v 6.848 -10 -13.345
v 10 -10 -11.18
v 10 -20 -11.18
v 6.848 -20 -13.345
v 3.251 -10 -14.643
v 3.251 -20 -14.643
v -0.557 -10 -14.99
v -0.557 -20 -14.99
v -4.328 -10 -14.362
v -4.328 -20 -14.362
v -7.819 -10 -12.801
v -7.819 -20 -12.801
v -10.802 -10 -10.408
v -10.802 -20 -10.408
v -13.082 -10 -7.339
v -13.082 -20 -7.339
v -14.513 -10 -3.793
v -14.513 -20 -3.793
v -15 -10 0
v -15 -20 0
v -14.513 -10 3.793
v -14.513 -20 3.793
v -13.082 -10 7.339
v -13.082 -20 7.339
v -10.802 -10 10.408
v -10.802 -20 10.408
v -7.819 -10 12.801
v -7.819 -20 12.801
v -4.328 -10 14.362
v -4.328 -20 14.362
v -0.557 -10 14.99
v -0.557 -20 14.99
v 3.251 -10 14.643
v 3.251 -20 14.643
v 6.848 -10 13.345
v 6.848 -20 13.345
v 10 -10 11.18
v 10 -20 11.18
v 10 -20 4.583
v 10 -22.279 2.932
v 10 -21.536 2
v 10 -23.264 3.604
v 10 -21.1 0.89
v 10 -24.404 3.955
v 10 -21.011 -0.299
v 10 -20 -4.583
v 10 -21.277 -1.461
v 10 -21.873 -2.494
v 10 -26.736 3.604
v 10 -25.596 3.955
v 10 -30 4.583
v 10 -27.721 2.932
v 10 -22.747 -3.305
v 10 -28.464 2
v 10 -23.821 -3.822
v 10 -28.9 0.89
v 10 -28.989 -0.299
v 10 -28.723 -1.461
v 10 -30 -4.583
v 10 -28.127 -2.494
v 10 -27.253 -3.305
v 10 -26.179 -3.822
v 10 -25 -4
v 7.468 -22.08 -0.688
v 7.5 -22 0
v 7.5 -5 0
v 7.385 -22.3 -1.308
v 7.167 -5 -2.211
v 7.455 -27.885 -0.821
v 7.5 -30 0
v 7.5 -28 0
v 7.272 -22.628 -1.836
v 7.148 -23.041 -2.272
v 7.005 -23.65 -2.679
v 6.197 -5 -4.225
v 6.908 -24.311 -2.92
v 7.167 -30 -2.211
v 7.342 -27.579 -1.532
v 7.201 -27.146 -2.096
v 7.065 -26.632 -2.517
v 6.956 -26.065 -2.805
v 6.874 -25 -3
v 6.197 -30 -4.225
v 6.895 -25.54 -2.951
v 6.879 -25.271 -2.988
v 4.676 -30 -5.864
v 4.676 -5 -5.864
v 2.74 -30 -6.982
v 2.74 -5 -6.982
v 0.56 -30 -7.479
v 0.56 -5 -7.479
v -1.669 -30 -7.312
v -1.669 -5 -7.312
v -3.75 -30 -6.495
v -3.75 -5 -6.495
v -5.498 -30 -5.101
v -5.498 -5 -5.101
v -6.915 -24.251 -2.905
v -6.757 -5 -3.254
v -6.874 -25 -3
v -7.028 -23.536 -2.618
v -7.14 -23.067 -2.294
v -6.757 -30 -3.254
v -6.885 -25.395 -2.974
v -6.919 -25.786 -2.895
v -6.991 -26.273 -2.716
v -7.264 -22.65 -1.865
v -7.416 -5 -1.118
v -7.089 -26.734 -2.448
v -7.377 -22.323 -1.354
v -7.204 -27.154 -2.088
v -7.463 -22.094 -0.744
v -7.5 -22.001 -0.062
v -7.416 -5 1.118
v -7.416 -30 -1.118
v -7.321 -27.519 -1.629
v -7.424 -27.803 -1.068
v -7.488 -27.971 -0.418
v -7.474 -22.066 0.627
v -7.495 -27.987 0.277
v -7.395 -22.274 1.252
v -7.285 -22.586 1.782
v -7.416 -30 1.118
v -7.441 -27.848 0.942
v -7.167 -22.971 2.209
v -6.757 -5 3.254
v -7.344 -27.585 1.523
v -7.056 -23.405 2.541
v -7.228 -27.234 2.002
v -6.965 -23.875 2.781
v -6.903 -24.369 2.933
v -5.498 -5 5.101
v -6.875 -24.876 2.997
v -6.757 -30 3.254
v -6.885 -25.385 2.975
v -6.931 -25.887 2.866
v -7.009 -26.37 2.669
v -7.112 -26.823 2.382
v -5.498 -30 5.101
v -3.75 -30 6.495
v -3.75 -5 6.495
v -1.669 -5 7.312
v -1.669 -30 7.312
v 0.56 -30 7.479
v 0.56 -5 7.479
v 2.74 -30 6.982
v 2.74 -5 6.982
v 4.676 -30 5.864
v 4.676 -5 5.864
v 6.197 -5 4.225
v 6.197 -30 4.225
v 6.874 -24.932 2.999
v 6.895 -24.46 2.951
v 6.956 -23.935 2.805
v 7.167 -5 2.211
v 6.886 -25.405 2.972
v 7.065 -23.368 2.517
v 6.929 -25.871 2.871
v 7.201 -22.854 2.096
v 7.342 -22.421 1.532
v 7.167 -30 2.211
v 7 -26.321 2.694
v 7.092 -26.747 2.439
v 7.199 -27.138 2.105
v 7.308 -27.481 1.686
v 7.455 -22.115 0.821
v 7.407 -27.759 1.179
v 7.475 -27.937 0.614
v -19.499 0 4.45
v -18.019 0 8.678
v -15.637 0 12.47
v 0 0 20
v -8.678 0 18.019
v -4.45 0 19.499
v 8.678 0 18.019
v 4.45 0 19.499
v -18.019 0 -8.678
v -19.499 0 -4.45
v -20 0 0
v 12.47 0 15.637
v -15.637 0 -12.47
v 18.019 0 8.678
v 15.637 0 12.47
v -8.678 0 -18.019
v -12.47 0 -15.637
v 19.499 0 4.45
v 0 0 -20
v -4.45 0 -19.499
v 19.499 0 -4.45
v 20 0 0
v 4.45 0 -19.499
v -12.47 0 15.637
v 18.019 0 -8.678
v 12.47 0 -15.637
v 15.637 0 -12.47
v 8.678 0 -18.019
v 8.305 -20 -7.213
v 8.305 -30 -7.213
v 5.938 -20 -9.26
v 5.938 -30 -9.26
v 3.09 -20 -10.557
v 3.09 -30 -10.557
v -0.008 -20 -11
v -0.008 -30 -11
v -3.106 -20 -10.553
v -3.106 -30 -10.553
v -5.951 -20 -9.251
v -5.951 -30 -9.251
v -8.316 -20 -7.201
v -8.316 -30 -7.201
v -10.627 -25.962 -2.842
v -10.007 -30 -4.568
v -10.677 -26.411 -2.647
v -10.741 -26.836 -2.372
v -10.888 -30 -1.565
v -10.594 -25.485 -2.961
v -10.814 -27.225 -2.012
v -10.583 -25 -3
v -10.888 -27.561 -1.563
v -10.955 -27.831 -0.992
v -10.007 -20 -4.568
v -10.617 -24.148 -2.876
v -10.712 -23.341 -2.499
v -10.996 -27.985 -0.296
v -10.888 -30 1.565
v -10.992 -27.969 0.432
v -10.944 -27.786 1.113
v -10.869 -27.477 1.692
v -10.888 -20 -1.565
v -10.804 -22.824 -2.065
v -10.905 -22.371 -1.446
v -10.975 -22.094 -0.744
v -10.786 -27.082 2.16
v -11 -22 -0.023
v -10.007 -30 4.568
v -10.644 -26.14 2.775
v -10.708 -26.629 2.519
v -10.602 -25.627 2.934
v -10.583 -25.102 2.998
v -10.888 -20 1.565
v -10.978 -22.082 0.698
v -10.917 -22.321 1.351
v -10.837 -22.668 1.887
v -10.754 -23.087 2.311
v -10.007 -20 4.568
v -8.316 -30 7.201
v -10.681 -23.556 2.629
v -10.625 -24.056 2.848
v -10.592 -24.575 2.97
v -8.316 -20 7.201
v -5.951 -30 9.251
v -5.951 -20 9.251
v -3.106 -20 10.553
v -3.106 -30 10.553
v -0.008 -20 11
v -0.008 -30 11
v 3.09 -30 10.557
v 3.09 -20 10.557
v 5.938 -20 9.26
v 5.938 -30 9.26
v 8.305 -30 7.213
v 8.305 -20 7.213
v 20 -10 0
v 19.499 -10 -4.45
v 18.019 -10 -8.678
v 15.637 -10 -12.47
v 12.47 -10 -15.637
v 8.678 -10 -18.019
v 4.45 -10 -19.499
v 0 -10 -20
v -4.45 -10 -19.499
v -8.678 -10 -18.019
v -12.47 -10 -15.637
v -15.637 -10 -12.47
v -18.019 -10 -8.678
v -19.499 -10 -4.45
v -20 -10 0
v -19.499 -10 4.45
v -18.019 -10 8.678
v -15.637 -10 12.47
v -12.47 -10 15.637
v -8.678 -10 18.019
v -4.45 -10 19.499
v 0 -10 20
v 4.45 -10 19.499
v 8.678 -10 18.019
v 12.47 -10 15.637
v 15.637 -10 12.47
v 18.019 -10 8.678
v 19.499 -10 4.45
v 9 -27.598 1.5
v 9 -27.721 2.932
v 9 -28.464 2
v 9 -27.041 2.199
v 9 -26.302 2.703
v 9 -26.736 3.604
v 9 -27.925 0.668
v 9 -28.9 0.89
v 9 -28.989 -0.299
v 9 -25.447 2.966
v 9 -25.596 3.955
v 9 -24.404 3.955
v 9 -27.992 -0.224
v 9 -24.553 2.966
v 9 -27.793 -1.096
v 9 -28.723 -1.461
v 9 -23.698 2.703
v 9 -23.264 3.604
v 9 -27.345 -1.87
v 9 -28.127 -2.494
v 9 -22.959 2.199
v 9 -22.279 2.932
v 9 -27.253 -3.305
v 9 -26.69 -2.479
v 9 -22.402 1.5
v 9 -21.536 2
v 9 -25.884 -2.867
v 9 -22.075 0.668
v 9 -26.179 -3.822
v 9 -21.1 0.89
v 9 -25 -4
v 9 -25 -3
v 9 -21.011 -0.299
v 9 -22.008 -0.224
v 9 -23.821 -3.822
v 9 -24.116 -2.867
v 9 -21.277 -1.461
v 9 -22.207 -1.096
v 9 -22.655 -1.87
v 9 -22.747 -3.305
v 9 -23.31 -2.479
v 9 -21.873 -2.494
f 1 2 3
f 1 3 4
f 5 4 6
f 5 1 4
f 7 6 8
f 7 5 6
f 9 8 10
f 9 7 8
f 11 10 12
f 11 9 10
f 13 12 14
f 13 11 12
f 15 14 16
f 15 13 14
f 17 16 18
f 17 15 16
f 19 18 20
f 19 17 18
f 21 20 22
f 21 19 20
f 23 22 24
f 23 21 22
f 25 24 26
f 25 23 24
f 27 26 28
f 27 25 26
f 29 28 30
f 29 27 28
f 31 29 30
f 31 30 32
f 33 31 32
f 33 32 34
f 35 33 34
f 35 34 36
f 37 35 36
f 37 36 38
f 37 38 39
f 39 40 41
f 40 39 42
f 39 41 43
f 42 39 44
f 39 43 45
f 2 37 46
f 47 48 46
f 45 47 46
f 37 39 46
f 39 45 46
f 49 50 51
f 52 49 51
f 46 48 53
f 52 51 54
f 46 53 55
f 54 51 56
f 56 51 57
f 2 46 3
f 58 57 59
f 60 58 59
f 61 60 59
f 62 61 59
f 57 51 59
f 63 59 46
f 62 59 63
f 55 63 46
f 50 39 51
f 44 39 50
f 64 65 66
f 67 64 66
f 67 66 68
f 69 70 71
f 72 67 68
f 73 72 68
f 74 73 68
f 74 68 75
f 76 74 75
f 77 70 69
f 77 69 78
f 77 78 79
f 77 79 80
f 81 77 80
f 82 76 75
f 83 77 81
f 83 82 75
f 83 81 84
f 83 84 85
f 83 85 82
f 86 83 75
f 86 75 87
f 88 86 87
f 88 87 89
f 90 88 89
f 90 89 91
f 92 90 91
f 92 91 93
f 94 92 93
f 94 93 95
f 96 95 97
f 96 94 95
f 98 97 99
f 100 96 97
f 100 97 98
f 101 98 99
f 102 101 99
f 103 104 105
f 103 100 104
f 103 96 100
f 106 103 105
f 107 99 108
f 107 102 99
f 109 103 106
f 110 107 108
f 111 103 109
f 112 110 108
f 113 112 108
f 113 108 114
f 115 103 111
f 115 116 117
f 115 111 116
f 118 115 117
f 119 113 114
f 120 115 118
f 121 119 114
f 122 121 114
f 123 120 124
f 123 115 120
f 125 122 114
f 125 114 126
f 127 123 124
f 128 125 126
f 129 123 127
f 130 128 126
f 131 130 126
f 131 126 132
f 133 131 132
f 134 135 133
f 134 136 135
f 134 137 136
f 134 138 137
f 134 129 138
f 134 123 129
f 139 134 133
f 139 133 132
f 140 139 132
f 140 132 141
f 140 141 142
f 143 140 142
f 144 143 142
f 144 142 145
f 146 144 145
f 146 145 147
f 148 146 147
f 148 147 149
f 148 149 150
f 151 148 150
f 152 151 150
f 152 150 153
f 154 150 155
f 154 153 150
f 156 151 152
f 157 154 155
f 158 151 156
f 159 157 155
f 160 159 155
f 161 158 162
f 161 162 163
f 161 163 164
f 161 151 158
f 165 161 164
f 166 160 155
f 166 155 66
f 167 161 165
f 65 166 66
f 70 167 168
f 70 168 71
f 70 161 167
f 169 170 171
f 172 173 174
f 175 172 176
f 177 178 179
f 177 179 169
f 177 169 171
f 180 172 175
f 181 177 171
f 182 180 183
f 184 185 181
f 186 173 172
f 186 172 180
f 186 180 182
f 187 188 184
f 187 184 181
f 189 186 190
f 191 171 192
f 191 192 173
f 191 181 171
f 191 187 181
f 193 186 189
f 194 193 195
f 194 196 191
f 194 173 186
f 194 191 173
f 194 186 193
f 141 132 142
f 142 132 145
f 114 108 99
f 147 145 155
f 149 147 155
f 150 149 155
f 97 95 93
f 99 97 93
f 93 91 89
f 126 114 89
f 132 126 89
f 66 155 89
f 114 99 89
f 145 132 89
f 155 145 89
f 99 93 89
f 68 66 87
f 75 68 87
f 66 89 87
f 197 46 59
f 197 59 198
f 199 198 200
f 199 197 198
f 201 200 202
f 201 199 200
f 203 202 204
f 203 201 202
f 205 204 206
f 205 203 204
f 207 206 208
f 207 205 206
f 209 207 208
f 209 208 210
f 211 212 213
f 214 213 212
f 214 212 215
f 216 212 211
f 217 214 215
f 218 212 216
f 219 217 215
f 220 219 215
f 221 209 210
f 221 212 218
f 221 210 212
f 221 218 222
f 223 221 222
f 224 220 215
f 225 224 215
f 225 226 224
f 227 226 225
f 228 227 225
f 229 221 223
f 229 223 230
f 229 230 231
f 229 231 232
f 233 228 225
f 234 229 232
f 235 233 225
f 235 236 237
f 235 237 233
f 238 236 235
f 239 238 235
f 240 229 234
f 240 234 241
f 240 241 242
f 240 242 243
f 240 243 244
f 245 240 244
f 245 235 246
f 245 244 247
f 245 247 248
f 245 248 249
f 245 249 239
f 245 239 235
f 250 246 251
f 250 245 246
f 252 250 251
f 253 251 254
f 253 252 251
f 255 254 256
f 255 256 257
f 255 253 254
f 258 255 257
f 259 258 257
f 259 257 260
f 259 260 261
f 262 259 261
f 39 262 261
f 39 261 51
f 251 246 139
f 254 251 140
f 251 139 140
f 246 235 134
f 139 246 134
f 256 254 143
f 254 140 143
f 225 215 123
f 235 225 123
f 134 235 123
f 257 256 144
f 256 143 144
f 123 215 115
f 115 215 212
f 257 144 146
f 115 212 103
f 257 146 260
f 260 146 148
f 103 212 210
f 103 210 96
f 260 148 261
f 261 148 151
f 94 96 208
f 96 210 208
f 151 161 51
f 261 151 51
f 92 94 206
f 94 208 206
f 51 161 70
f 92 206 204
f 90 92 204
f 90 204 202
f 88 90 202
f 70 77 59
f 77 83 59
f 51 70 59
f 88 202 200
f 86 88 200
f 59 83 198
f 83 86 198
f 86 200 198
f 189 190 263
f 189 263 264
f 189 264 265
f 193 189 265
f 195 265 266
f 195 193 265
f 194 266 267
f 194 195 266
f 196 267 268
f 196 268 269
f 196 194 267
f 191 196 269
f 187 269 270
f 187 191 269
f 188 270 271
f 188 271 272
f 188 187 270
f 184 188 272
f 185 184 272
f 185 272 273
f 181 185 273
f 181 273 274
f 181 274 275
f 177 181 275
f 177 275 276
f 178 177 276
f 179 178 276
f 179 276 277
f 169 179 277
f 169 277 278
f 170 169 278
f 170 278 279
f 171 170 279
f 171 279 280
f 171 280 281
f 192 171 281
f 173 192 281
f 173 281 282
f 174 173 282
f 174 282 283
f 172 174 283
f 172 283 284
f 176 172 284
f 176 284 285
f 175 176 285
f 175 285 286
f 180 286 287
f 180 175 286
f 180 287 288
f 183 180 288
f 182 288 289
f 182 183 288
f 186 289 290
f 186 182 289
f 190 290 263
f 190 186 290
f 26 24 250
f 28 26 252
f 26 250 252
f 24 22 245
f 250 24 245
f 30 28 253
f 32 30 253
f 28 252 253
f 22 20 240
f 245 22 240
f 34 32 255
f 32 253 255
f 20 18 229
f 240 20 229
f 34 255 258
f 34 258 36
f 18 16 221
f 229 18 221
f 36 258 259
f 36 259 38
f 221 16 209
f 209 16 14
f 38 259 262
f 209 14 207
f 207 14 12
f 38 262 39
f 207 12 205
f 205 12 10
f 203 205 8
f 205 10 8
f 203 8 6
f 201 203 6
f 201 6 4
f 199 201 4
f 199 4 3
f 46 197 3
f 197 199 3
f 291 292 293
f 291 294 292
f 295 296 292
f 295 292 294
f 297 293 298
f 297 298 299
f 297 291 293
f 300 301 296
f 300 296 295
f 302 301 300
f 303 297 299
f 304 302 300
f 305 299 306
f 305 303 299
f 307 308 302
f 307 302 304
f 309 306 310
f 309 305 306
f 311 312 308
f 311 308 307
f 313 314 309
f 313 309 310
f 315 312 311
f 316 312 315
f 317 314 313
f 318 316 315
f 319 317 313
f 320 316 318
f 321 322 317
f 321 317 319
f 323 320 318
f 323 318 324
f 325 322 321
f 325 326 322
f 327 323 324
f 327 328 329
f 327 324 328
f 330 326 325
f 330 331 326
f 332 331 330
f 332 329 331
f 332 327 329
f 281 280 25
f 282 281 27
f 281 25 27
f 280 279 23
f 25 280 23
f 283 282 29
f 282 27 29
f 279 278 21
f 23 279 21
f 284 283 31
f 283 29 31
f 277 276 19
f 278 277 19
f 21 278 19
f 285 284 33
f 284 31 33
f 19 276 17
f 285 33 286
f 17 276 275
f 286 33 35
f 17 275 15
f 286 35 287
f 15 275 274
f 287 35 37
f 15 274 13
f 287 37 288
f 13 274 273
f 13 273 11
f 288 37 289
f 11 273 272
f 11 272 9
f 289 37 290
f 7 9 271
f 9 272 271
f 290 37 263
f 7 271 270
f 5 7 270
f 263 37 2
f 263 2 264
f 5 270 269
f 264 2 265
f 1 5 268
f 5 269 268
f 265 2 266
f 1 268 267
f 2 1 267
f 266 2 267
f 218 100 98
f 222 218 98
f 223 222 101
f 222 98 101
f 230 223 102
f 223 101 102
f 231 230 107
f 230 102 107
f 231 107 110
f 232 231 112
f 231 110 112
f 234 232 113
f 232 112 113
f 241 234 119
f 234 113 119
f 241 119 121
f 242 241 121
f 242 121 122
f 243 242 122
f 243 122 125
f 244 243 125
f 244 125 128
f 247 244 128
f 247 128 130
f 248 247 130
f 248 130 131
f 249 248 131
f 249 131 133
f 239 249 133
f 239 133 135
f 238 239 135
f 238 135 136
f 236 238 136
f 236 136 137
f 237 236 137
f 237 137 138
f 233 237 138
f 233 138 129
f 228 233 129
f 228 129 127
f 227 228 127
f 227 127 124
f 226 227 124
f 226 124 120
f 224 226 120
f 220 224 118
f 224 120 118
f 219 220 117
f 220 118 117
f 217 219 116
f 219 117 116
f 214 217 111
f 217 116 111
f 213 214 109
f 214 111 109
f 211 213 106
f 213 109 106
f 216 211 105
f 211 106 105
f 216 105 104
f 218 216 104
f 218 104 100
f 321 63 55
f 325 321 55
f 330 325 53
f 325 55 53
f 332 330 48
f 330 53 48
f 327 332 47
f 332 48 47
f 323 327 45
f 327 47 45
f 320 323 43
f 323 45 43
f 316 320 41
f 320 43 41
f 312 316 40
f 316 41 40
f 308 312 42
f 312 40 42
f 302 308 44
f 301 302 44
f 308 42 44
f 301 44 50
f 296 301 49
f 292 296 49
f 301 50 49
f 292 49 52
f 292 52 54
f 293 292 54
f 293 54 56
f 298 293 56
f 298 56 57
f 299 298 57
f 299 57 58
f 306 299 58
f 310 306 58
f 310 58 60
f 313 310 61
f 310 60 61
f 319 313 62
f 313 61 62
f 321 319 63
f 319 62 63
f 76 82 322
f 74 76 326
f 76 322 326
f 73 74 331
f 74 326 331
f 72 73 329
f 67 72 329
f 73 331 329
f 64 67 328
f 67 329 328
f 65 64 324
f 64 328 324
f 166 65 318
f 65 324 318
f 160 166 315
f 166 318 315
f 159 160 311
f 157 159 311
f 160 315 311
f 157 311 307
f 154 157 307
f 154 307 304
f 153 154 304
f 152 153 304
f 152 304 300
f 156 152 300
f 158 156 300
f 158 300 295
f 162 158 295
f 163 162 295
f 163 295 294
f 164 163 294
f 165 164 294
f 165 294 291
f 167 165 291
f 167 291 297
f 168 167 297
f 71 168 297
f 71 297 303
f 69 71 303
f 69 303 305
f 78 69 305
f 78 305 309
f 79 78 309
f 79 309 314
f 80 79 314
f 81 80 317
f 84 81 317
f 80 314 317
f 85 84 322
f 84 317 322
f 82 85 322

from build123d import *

# Parameters (mm, degrees)
SKETCH1_R           = 20
STOCK_DEPTH         = 20
CUT_EXTRUDE1_START  = -10
SKETCH2_OUTSIDE_W   = 54
SKETCH2_OUTSIDE_H   = 54
SKETCH2_OUTSIDE_R   = 15
CUT_EXTRUDE1_DEPTH  = 10
BOSS_EXTRUDE2_START = -20
SKETCH4_R           = 11
BOSS_EXTRUDE2_DEPTH = 10
MAINKEY_START       = -30
SKETCH3_W           = 10
SKETCH3_H           = 22.360679774
MAINKEY_DEPTH       = 20
CENTREBORE_START    = -30
SKETCH5_R           = 7.5
CENTREBORE_DEPTH    = 25
SKETCH6_R           = 3
HOLES_DEPTH         = 23.674794
SKETCH7_R           = 4
CUT_EXTRUDE4_DEPTH  = 1


with BuildPart() as part:
    # Sketch1 → Stock (new body)
    with BuildSketch(Plane(origin=(0, 0, 0), x_dir=(1, 0, 0), z_dir=(0, 1, 0))):
        Circle(SKETCH1_R)
    extrude(amount=-STOCK_DEPTH)

    # Sketch2 outside → Cut-Extrude1 (cut)
    with BuildSketch(Plane(origin=(0, 0, 0), x_dir=(1, 0, 0), z_dir=(0, 1, 0)).offset(CUT_EXTRUDE1_START)):
        Rectangle(SKETCH2_OUTSIDE_W, SKETCH2_OUTSIDE_H)
        Circle(SKETCH2_OUTSIDE_R, mode=Mode.SUBTRACT)
    extrude(amount=-CUT_EXTRUDE1_DEPTH, mode=Mode.SUBTRACT)

    # Sketch4 → Boss-Extrude2 (add)
    with BuildSketch(Plane(origin=(0, 0, 0), x_dir=(1, 0, 0), z_dir=(0, 1, 0)).offset(BOSS_EXTRUDE2_START)):
        Circle(SKETCH4_R)
    extrude(amount=-BOSS_EXTRUDE2_DEPTH)

    # Sketch3 → MainKey (cut)
    with BuildSketch(Plane(origin=(0, 0, 0), x_dir=(1, 0, 0), z_dir=(0, 1, 0)).offset(MAINKEY_START)):
        with Locations((15, 0)):
            Rectangle(SKETCH3_W, SKETCH3_H)
    extrude(amount=MAINKEY_DEPTH, mode=Mode.SUBTRACT)

    # Sketch5 → CentreBore (cut)
    with BuildSketch(Plane(origin=(0, 0, 0), x_dir=(1, 0, 0), z_dir=(0, 1, 0)).offset(CENTREBORE_START)):
        Circle(SKETCH5_R)
    extrude(amount=CENTREBORE_DEPTH, mode=Mode.SUBTRACT)

    # Sketch6 → Holes (cut)
    with BuildSketch(Plane(origin=(10, 0, 0), x_dir=(0, 0, -1), z_dir=(1, 0, 0))):
        with Locations((0, -25)):
            Circle(SKETCH6_R)
    extrude(amount=-HOLES_DEPTH, mode=Mode.SUBTRACT)

    # Sketch7 → Cut-Extrude4 (cut)
    with BuildSketch(Plane(origin=(10, 0, 0), x_dir=(0, 0, -1), z_dir=(1, 0, 0))):
        with Locations((0, -25)):
            Circle(SKETCH7_R)
    extrude(amount=-CUT_EXTRUDE4_DEPTH, mode=Mode.SUBTRACT)


solid = part.part
